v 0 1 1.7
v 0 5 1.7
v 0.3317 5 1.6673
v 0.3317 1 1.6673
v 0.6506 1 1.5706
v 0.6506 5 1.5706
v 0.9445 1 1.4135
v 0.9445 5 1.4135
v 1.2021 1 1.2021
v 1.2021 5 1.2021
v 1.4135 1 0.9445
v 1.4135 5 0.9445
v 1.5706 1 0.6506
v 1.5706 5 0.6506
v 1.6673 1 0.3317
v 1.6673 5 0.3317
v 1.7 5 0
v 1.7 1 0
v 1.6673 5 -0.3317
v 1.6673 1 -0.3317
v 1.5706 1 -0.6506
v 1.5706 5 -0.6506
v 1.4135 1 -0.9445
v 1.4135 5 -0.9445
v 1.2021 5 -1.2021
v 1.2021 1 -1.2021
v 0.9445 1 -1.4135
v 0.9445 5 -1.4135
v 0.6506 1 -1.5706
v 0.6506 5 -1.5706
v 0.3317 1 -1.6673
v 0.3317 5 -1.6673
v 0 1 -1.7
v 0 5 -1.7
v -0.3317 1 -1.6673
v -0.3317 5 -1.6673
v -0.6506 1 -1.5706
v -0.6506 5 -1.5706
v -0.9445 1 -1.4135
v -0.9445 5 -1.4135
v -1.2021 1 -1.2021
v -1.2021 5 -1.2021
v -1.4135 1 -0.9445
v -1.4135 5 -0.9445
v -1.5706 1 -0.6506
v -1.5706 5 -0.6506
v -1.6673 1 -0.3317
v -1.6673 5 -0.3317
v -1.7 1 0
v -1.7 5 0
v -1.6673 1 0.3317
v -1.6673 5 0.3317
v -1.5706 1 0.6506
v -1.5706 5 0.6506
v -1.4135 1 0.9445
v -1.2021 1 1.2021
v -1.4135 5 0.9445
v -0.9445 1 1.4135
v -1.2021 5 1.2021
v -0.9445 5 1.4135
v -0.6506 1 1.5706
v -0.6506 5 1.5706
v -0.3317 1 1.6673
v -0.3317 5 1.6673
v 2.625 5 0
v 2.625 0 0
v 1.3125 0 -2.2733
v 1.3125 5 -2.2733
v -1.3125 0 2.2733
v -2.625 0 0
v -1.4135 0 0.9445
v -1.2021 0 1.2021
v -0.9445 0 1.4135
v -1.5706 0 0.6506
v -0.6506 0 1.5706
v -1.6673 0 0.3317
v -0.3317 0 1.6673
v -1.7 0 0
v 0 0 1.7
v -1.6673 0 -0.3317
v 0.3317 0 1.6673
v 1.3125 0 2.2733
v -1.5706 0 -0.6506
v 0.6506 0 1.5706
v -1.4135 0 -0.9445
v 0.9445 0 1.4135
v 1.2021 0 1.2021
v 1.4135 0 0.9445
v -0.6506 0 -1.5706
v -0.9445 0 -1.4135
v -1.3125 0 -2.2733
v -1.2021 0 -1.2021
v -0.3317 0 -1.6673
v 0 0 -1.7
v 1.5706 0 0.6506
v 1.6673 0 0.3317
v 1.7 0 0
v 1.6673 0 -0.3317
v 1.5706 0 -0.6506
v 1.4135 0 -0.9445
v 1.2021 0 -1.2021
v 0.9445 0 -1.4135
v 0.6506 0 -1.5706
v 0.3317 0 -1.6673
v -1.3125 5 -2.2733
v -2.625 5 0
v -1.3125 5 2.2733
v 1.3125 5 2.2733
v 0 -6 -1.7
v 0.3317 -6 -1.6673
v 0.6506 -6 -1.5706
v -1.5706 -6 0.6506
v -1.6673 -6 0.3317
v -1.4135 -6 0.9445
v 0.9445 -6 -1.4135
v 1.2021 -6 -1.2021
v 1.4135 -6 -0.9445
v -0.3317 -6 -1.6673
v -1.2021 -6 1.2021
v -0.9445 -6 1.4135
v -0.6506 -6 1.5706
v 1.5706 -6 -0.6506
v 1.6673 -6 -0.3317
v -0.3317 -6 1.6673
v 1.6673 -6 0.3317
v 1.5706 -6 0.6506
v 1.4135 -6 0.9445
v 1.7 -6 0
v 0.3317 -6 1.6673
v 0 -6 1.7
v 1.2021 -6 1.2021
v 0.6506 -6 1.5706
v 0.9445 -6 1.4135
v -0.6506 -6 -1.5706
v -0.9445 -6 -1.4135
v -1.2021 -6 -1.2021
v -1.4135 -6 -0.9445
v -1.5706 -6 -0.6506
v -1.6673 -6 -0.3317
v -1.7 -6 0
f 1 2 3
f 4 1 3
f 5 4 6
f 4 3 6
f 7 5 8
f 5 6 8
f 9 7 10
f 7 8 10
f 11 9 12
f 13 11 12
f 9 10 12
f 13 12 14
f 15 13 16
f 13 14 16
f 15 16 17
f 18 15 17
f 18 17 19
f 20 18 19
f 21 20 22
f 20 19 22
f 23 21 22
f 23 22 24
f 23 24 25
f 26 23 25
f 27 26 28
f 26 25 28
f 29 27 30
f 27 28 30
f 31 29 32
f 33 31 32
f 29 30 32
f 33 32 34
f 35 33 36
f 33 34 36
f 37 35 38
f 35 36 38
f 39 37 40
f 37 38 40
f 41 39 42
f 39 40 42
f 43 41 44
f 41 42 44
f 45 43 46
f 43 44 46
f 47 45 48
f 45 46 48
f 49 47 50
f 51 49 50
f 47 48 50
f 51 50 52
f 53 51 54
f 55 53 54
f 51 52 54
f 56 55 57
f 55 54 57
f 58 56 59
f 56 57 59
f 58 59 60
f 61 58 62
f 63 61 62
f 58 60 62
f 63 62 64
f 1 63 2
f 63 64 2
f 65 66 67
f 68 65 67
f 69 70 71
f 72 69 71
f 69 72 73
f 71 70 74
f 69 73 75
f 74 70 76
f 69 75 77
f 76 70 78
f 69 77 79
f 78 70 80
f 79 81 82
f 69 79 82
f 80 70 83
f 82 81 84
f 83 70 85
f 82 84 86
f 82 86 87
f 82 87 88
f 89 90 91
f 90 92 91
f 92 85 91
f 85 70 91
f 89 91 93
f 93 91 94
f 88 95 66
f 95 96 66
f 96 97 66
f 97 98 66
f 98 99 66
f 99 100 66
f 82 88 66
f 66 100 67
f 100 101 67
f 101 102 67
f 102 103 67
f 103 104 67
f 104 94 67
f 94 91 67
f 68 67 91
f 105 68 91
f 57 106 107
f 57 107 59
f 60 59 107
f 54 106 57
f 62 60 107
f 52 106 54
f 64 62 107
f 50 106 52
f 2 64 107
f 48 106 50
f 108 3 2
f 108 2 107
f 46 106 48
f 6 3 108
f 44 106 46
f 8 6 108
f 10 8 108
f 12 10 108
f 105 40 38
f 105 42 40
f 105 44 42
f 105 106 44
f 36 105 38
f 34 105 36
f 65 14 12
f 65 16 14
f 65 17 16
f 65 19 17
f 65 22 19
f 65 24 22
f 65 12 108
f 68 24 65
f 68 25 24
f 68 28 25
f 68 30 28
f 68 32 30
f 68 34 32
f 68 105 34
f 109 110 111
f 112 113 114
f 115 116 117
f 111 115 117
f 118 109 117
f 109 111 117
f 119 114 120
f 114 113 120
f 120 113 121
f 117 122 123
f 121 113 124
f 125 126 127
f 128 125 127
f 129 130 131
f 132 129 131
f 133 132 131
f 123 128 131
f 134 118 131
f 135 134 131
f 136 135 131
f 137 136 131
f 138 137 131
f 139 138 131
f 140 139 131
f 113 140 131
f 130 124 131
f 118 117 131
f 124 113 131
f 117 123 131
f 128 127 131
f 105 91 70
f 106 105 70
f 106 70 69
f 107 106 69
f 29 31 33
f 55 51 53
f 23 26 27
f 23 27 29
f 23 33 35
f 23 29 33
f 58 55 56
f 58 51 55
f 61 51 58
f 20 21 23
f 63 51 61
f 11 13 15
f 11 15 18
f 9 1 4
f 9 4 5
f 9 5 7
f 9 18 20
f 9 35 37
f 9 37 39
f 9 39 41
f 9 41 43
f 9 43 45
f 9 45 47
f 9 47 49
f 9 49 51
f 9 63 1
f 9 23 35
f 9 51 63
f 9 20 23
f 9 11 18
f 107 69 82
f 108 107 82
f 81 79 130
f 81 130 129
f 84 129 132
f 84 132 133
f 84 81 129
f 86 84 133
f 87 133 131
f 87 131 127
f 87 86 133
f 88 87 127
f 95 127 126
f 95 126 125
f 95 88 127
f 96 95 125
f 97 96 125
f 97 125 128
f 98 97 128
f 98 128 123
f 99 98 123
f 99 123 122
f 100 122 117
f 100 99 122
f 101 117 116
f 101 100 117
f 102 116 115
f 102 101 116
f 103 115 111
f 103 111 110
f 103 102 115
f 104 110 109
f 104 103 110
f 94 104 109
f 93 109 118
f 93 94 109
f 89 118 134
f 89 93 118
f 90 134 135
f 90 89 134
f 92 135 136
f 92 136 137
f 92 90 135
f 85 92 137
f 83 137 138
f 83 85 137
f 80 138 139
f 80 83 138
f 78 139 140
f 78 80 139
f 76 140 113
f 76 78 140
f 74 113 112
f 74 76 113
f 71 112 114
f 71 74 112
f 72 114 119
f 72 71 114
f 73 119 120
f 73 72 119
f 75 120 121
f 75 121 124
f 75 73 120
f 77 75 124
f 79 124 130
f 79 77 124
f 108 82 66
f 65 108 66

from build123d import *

# Parameters (mm, degrees)
EXTRUDE_1_DEPTH     = 5
SKETCH_2_R          = 1.7
EXTRUDE_2_DEPTH     = 6
SKETCH_3_R          = 1.7
CUT_EXTRUDE_1_DEPTH = 4


with BuildPart() as part:
    # 草图1 → 凸台-拉伸1 (new body)
    with BuildSketch(Plane(origin=(0, 0, 0), x_dir=(1, 0, 0), z_dir=(0, 1, 0))):
        Polygon((1.3125, -2.273316685), (2.625, 0), (1.3125, 2.273316685), (-1.3125, 2.273316685), (-2.625, 0), (-1.3125, -2.273316685), align=None)
    extrude(amount=EXTRUDE_1_DEPTH)

    # 草图2 → 凸台-拉伸2 (add)
    with BuildSketch(Plane(origin=(0, 0, 0), x_dir=(1, 0, 0), z_dir=(0, 1, 0))):
        with Locations(Location((0, 0, 0), (0, 0, 270))):
            Circle(SKETCH_2_R)
    extrude(amount=-EXTRUDE_2_DEPTH)

    # 草图3 → 切除-拉伸1 (cut)
    with BuildSketch(Plane(origin=(0, 5, 0), x_dir=(1, 0, 0), z_dir=(0, 1, 0))):
        with Locations(Location((0, 0, 0), (0, 0, 270))):
            Circle(SKETCH_3_R)
    extrude(amount=-CUT_EXTRUDE_1_DEPTH, mode=Mode.SUBTRACT)


solid = part.part
